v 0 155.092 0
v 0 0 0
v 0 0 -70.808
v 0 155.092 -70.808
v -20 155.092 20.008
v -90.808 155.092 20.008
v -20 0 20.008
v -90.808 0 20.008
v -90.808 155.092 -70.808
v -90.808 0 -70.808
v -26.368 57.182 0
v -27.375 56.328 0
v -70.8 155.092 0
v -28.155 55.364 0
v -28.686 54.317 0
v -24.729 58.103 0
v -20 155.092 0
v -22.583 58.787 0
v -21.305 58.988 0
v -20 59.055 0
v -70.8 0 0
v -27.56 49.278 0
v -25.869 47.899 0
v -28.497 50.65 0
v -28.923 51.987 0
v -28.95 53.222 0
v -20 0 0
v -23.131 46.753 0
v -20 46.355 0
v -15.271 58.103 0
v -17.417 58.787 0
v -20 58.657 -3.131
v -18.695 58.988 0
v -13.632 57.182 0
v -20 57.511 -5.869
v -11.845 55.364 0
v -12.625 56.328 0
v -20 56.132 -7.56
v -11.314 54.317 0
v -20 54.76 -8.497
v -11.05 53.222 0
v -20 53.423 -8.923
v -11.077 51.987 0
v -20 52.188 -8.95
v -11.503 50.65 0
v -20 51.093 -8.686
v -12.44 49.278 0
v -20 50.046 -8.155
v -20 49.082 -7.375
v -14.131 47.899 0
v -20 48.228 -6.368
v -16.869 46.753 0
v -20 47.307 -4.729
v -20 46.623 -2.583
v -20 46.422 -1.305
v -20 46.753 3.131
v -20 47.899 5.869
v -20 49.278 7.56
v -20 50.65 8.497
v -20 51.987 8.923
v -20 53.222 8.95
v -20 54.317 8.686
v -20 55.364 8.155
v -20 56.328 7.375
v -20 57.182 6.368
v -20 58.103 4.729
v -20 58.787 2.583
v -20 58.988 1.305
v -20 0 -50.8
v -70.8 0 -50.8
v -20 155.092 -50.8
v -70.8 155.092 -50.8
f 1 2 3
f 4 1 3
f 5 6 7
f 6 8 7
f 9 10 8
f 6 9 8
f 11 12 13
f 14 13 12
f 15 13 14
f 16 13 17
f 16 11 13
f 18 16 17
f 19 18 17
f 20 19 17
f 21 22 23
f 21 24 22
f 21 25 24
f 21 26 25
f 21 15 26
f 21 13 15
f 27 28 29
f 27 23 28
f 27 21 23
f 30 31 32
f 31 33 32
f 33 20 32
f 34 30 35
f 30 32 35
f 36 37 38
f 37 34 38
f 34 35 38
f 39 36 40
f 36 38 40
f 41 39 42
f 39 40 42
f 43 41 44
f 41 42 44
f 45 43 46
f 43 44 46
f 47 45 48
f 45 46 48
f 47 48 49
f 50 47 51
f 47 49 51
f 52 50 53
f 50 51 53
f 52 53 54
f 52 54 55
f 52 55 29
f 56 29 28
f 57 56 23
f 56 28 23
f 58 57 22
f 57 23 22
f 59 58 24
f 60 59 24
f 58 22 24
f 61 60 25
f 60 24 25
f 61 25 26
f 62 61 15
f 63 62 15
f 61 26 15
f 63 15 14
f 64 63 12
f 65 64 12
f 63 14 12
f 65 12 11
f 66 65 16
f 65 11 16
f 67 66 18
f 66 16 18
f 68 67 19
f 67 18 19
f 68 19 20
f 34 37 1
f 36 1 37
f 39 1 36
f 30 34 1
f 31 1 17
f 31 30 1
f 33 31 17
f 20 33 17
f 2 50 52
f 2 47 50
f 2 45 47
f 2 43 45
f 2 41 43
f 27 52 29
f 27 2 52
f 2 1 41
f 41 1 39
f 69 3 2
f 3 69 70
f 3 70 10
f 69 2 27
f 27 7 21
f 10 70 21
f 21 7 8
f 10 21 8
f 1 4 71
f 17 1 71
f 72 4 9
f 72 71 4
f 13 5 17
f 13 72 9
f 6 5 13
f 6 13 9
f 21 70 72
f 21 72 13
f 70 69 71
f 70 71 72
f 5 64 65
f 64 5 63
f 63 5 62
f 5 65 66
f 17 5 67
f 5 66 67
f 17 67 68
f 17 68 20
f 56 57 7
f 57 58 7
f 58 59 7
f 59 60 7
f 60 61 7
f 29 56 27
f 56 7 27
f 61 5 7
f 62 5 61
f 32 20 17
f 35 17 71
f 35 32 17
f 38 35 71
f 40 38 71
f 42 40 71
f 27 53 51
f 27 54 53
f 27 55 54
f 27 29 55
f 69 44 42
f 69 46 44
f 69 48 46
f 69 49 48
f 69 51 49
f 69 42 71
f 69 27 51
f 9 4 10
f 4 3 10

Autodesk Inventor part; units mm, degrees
ref_plane "YZ Plane" through (0, 0, 0) normal (1, 0, 0) x (0, 1, 0)
ref_plane "XZ Plane" through (0, 0, 0) normal (0, 1, 0) x (-1, 0, 0)
sketch "Sketch1" plane through (0, 0, 0) normal (0, 1, 0) x (-1, 0, 0)
  line L0 (0, 0) -> (20, 0)
  line L1 (20, 0) -> (20, -50.8)
  line L2 (20, -50.8) -> (70.8, -50.8)
  line L3 (70.8, -50.8) -> (70.8, 0)
  line L4 (70.8, 0) -> (20, 0)
  line L5 (0, 0) -> (0, -70.808)
  line L6 (0, -70.808) -> (90.808, -70.808)
  line L7 (90.808, -70.808) -> (90.808, 20.008)
  line L8 (90.808, 20.008) -> (20, 20.008)
  line L9 (20, 20.008) -> (20, 0)
  dimension "d0" = 20
  dimension "d1" = 50.8
  dimension "d2" = 50.8
  dimension "d3" = 50.8
  dimension "d4" = 50.8
  dimension "d6" = 28.2899
  dimension "d7" = 28.2956
  dimension "d8" = 28.2956
  dimension "d11" = 20.008
extrude "Extrusion1" add sketch "Sketch1" along normal blind 155.0924
ref_plane "Work Plane1" through (0, 0, 0) normal (-0.7071, 0, -0.7071) x (0, 1, 0)
sketch "Sketch2" plane through (0, 0, 0) normal (-0.7071, 0, -0.7071) x (0, 1, 0)
  line L0 (155.0924, 21.7789) -> (155.0924, -14.1421) projected
  line L1 (155.0924, -14.1421) -> (52.705, -14.1421)
  line L2 (0, -14.1421) -> (155.0924, -14.1421) projected
  point P0 (0, 0)
  dimension "d15" = 102.3874
hole "Hole1" at (-10, 52.705, 10) direction (-0.7071, 0, -0.7071) diameter 12.7 depth 25.4
properties part number "LegHolderOutlet" material "Wood (Birch)"
